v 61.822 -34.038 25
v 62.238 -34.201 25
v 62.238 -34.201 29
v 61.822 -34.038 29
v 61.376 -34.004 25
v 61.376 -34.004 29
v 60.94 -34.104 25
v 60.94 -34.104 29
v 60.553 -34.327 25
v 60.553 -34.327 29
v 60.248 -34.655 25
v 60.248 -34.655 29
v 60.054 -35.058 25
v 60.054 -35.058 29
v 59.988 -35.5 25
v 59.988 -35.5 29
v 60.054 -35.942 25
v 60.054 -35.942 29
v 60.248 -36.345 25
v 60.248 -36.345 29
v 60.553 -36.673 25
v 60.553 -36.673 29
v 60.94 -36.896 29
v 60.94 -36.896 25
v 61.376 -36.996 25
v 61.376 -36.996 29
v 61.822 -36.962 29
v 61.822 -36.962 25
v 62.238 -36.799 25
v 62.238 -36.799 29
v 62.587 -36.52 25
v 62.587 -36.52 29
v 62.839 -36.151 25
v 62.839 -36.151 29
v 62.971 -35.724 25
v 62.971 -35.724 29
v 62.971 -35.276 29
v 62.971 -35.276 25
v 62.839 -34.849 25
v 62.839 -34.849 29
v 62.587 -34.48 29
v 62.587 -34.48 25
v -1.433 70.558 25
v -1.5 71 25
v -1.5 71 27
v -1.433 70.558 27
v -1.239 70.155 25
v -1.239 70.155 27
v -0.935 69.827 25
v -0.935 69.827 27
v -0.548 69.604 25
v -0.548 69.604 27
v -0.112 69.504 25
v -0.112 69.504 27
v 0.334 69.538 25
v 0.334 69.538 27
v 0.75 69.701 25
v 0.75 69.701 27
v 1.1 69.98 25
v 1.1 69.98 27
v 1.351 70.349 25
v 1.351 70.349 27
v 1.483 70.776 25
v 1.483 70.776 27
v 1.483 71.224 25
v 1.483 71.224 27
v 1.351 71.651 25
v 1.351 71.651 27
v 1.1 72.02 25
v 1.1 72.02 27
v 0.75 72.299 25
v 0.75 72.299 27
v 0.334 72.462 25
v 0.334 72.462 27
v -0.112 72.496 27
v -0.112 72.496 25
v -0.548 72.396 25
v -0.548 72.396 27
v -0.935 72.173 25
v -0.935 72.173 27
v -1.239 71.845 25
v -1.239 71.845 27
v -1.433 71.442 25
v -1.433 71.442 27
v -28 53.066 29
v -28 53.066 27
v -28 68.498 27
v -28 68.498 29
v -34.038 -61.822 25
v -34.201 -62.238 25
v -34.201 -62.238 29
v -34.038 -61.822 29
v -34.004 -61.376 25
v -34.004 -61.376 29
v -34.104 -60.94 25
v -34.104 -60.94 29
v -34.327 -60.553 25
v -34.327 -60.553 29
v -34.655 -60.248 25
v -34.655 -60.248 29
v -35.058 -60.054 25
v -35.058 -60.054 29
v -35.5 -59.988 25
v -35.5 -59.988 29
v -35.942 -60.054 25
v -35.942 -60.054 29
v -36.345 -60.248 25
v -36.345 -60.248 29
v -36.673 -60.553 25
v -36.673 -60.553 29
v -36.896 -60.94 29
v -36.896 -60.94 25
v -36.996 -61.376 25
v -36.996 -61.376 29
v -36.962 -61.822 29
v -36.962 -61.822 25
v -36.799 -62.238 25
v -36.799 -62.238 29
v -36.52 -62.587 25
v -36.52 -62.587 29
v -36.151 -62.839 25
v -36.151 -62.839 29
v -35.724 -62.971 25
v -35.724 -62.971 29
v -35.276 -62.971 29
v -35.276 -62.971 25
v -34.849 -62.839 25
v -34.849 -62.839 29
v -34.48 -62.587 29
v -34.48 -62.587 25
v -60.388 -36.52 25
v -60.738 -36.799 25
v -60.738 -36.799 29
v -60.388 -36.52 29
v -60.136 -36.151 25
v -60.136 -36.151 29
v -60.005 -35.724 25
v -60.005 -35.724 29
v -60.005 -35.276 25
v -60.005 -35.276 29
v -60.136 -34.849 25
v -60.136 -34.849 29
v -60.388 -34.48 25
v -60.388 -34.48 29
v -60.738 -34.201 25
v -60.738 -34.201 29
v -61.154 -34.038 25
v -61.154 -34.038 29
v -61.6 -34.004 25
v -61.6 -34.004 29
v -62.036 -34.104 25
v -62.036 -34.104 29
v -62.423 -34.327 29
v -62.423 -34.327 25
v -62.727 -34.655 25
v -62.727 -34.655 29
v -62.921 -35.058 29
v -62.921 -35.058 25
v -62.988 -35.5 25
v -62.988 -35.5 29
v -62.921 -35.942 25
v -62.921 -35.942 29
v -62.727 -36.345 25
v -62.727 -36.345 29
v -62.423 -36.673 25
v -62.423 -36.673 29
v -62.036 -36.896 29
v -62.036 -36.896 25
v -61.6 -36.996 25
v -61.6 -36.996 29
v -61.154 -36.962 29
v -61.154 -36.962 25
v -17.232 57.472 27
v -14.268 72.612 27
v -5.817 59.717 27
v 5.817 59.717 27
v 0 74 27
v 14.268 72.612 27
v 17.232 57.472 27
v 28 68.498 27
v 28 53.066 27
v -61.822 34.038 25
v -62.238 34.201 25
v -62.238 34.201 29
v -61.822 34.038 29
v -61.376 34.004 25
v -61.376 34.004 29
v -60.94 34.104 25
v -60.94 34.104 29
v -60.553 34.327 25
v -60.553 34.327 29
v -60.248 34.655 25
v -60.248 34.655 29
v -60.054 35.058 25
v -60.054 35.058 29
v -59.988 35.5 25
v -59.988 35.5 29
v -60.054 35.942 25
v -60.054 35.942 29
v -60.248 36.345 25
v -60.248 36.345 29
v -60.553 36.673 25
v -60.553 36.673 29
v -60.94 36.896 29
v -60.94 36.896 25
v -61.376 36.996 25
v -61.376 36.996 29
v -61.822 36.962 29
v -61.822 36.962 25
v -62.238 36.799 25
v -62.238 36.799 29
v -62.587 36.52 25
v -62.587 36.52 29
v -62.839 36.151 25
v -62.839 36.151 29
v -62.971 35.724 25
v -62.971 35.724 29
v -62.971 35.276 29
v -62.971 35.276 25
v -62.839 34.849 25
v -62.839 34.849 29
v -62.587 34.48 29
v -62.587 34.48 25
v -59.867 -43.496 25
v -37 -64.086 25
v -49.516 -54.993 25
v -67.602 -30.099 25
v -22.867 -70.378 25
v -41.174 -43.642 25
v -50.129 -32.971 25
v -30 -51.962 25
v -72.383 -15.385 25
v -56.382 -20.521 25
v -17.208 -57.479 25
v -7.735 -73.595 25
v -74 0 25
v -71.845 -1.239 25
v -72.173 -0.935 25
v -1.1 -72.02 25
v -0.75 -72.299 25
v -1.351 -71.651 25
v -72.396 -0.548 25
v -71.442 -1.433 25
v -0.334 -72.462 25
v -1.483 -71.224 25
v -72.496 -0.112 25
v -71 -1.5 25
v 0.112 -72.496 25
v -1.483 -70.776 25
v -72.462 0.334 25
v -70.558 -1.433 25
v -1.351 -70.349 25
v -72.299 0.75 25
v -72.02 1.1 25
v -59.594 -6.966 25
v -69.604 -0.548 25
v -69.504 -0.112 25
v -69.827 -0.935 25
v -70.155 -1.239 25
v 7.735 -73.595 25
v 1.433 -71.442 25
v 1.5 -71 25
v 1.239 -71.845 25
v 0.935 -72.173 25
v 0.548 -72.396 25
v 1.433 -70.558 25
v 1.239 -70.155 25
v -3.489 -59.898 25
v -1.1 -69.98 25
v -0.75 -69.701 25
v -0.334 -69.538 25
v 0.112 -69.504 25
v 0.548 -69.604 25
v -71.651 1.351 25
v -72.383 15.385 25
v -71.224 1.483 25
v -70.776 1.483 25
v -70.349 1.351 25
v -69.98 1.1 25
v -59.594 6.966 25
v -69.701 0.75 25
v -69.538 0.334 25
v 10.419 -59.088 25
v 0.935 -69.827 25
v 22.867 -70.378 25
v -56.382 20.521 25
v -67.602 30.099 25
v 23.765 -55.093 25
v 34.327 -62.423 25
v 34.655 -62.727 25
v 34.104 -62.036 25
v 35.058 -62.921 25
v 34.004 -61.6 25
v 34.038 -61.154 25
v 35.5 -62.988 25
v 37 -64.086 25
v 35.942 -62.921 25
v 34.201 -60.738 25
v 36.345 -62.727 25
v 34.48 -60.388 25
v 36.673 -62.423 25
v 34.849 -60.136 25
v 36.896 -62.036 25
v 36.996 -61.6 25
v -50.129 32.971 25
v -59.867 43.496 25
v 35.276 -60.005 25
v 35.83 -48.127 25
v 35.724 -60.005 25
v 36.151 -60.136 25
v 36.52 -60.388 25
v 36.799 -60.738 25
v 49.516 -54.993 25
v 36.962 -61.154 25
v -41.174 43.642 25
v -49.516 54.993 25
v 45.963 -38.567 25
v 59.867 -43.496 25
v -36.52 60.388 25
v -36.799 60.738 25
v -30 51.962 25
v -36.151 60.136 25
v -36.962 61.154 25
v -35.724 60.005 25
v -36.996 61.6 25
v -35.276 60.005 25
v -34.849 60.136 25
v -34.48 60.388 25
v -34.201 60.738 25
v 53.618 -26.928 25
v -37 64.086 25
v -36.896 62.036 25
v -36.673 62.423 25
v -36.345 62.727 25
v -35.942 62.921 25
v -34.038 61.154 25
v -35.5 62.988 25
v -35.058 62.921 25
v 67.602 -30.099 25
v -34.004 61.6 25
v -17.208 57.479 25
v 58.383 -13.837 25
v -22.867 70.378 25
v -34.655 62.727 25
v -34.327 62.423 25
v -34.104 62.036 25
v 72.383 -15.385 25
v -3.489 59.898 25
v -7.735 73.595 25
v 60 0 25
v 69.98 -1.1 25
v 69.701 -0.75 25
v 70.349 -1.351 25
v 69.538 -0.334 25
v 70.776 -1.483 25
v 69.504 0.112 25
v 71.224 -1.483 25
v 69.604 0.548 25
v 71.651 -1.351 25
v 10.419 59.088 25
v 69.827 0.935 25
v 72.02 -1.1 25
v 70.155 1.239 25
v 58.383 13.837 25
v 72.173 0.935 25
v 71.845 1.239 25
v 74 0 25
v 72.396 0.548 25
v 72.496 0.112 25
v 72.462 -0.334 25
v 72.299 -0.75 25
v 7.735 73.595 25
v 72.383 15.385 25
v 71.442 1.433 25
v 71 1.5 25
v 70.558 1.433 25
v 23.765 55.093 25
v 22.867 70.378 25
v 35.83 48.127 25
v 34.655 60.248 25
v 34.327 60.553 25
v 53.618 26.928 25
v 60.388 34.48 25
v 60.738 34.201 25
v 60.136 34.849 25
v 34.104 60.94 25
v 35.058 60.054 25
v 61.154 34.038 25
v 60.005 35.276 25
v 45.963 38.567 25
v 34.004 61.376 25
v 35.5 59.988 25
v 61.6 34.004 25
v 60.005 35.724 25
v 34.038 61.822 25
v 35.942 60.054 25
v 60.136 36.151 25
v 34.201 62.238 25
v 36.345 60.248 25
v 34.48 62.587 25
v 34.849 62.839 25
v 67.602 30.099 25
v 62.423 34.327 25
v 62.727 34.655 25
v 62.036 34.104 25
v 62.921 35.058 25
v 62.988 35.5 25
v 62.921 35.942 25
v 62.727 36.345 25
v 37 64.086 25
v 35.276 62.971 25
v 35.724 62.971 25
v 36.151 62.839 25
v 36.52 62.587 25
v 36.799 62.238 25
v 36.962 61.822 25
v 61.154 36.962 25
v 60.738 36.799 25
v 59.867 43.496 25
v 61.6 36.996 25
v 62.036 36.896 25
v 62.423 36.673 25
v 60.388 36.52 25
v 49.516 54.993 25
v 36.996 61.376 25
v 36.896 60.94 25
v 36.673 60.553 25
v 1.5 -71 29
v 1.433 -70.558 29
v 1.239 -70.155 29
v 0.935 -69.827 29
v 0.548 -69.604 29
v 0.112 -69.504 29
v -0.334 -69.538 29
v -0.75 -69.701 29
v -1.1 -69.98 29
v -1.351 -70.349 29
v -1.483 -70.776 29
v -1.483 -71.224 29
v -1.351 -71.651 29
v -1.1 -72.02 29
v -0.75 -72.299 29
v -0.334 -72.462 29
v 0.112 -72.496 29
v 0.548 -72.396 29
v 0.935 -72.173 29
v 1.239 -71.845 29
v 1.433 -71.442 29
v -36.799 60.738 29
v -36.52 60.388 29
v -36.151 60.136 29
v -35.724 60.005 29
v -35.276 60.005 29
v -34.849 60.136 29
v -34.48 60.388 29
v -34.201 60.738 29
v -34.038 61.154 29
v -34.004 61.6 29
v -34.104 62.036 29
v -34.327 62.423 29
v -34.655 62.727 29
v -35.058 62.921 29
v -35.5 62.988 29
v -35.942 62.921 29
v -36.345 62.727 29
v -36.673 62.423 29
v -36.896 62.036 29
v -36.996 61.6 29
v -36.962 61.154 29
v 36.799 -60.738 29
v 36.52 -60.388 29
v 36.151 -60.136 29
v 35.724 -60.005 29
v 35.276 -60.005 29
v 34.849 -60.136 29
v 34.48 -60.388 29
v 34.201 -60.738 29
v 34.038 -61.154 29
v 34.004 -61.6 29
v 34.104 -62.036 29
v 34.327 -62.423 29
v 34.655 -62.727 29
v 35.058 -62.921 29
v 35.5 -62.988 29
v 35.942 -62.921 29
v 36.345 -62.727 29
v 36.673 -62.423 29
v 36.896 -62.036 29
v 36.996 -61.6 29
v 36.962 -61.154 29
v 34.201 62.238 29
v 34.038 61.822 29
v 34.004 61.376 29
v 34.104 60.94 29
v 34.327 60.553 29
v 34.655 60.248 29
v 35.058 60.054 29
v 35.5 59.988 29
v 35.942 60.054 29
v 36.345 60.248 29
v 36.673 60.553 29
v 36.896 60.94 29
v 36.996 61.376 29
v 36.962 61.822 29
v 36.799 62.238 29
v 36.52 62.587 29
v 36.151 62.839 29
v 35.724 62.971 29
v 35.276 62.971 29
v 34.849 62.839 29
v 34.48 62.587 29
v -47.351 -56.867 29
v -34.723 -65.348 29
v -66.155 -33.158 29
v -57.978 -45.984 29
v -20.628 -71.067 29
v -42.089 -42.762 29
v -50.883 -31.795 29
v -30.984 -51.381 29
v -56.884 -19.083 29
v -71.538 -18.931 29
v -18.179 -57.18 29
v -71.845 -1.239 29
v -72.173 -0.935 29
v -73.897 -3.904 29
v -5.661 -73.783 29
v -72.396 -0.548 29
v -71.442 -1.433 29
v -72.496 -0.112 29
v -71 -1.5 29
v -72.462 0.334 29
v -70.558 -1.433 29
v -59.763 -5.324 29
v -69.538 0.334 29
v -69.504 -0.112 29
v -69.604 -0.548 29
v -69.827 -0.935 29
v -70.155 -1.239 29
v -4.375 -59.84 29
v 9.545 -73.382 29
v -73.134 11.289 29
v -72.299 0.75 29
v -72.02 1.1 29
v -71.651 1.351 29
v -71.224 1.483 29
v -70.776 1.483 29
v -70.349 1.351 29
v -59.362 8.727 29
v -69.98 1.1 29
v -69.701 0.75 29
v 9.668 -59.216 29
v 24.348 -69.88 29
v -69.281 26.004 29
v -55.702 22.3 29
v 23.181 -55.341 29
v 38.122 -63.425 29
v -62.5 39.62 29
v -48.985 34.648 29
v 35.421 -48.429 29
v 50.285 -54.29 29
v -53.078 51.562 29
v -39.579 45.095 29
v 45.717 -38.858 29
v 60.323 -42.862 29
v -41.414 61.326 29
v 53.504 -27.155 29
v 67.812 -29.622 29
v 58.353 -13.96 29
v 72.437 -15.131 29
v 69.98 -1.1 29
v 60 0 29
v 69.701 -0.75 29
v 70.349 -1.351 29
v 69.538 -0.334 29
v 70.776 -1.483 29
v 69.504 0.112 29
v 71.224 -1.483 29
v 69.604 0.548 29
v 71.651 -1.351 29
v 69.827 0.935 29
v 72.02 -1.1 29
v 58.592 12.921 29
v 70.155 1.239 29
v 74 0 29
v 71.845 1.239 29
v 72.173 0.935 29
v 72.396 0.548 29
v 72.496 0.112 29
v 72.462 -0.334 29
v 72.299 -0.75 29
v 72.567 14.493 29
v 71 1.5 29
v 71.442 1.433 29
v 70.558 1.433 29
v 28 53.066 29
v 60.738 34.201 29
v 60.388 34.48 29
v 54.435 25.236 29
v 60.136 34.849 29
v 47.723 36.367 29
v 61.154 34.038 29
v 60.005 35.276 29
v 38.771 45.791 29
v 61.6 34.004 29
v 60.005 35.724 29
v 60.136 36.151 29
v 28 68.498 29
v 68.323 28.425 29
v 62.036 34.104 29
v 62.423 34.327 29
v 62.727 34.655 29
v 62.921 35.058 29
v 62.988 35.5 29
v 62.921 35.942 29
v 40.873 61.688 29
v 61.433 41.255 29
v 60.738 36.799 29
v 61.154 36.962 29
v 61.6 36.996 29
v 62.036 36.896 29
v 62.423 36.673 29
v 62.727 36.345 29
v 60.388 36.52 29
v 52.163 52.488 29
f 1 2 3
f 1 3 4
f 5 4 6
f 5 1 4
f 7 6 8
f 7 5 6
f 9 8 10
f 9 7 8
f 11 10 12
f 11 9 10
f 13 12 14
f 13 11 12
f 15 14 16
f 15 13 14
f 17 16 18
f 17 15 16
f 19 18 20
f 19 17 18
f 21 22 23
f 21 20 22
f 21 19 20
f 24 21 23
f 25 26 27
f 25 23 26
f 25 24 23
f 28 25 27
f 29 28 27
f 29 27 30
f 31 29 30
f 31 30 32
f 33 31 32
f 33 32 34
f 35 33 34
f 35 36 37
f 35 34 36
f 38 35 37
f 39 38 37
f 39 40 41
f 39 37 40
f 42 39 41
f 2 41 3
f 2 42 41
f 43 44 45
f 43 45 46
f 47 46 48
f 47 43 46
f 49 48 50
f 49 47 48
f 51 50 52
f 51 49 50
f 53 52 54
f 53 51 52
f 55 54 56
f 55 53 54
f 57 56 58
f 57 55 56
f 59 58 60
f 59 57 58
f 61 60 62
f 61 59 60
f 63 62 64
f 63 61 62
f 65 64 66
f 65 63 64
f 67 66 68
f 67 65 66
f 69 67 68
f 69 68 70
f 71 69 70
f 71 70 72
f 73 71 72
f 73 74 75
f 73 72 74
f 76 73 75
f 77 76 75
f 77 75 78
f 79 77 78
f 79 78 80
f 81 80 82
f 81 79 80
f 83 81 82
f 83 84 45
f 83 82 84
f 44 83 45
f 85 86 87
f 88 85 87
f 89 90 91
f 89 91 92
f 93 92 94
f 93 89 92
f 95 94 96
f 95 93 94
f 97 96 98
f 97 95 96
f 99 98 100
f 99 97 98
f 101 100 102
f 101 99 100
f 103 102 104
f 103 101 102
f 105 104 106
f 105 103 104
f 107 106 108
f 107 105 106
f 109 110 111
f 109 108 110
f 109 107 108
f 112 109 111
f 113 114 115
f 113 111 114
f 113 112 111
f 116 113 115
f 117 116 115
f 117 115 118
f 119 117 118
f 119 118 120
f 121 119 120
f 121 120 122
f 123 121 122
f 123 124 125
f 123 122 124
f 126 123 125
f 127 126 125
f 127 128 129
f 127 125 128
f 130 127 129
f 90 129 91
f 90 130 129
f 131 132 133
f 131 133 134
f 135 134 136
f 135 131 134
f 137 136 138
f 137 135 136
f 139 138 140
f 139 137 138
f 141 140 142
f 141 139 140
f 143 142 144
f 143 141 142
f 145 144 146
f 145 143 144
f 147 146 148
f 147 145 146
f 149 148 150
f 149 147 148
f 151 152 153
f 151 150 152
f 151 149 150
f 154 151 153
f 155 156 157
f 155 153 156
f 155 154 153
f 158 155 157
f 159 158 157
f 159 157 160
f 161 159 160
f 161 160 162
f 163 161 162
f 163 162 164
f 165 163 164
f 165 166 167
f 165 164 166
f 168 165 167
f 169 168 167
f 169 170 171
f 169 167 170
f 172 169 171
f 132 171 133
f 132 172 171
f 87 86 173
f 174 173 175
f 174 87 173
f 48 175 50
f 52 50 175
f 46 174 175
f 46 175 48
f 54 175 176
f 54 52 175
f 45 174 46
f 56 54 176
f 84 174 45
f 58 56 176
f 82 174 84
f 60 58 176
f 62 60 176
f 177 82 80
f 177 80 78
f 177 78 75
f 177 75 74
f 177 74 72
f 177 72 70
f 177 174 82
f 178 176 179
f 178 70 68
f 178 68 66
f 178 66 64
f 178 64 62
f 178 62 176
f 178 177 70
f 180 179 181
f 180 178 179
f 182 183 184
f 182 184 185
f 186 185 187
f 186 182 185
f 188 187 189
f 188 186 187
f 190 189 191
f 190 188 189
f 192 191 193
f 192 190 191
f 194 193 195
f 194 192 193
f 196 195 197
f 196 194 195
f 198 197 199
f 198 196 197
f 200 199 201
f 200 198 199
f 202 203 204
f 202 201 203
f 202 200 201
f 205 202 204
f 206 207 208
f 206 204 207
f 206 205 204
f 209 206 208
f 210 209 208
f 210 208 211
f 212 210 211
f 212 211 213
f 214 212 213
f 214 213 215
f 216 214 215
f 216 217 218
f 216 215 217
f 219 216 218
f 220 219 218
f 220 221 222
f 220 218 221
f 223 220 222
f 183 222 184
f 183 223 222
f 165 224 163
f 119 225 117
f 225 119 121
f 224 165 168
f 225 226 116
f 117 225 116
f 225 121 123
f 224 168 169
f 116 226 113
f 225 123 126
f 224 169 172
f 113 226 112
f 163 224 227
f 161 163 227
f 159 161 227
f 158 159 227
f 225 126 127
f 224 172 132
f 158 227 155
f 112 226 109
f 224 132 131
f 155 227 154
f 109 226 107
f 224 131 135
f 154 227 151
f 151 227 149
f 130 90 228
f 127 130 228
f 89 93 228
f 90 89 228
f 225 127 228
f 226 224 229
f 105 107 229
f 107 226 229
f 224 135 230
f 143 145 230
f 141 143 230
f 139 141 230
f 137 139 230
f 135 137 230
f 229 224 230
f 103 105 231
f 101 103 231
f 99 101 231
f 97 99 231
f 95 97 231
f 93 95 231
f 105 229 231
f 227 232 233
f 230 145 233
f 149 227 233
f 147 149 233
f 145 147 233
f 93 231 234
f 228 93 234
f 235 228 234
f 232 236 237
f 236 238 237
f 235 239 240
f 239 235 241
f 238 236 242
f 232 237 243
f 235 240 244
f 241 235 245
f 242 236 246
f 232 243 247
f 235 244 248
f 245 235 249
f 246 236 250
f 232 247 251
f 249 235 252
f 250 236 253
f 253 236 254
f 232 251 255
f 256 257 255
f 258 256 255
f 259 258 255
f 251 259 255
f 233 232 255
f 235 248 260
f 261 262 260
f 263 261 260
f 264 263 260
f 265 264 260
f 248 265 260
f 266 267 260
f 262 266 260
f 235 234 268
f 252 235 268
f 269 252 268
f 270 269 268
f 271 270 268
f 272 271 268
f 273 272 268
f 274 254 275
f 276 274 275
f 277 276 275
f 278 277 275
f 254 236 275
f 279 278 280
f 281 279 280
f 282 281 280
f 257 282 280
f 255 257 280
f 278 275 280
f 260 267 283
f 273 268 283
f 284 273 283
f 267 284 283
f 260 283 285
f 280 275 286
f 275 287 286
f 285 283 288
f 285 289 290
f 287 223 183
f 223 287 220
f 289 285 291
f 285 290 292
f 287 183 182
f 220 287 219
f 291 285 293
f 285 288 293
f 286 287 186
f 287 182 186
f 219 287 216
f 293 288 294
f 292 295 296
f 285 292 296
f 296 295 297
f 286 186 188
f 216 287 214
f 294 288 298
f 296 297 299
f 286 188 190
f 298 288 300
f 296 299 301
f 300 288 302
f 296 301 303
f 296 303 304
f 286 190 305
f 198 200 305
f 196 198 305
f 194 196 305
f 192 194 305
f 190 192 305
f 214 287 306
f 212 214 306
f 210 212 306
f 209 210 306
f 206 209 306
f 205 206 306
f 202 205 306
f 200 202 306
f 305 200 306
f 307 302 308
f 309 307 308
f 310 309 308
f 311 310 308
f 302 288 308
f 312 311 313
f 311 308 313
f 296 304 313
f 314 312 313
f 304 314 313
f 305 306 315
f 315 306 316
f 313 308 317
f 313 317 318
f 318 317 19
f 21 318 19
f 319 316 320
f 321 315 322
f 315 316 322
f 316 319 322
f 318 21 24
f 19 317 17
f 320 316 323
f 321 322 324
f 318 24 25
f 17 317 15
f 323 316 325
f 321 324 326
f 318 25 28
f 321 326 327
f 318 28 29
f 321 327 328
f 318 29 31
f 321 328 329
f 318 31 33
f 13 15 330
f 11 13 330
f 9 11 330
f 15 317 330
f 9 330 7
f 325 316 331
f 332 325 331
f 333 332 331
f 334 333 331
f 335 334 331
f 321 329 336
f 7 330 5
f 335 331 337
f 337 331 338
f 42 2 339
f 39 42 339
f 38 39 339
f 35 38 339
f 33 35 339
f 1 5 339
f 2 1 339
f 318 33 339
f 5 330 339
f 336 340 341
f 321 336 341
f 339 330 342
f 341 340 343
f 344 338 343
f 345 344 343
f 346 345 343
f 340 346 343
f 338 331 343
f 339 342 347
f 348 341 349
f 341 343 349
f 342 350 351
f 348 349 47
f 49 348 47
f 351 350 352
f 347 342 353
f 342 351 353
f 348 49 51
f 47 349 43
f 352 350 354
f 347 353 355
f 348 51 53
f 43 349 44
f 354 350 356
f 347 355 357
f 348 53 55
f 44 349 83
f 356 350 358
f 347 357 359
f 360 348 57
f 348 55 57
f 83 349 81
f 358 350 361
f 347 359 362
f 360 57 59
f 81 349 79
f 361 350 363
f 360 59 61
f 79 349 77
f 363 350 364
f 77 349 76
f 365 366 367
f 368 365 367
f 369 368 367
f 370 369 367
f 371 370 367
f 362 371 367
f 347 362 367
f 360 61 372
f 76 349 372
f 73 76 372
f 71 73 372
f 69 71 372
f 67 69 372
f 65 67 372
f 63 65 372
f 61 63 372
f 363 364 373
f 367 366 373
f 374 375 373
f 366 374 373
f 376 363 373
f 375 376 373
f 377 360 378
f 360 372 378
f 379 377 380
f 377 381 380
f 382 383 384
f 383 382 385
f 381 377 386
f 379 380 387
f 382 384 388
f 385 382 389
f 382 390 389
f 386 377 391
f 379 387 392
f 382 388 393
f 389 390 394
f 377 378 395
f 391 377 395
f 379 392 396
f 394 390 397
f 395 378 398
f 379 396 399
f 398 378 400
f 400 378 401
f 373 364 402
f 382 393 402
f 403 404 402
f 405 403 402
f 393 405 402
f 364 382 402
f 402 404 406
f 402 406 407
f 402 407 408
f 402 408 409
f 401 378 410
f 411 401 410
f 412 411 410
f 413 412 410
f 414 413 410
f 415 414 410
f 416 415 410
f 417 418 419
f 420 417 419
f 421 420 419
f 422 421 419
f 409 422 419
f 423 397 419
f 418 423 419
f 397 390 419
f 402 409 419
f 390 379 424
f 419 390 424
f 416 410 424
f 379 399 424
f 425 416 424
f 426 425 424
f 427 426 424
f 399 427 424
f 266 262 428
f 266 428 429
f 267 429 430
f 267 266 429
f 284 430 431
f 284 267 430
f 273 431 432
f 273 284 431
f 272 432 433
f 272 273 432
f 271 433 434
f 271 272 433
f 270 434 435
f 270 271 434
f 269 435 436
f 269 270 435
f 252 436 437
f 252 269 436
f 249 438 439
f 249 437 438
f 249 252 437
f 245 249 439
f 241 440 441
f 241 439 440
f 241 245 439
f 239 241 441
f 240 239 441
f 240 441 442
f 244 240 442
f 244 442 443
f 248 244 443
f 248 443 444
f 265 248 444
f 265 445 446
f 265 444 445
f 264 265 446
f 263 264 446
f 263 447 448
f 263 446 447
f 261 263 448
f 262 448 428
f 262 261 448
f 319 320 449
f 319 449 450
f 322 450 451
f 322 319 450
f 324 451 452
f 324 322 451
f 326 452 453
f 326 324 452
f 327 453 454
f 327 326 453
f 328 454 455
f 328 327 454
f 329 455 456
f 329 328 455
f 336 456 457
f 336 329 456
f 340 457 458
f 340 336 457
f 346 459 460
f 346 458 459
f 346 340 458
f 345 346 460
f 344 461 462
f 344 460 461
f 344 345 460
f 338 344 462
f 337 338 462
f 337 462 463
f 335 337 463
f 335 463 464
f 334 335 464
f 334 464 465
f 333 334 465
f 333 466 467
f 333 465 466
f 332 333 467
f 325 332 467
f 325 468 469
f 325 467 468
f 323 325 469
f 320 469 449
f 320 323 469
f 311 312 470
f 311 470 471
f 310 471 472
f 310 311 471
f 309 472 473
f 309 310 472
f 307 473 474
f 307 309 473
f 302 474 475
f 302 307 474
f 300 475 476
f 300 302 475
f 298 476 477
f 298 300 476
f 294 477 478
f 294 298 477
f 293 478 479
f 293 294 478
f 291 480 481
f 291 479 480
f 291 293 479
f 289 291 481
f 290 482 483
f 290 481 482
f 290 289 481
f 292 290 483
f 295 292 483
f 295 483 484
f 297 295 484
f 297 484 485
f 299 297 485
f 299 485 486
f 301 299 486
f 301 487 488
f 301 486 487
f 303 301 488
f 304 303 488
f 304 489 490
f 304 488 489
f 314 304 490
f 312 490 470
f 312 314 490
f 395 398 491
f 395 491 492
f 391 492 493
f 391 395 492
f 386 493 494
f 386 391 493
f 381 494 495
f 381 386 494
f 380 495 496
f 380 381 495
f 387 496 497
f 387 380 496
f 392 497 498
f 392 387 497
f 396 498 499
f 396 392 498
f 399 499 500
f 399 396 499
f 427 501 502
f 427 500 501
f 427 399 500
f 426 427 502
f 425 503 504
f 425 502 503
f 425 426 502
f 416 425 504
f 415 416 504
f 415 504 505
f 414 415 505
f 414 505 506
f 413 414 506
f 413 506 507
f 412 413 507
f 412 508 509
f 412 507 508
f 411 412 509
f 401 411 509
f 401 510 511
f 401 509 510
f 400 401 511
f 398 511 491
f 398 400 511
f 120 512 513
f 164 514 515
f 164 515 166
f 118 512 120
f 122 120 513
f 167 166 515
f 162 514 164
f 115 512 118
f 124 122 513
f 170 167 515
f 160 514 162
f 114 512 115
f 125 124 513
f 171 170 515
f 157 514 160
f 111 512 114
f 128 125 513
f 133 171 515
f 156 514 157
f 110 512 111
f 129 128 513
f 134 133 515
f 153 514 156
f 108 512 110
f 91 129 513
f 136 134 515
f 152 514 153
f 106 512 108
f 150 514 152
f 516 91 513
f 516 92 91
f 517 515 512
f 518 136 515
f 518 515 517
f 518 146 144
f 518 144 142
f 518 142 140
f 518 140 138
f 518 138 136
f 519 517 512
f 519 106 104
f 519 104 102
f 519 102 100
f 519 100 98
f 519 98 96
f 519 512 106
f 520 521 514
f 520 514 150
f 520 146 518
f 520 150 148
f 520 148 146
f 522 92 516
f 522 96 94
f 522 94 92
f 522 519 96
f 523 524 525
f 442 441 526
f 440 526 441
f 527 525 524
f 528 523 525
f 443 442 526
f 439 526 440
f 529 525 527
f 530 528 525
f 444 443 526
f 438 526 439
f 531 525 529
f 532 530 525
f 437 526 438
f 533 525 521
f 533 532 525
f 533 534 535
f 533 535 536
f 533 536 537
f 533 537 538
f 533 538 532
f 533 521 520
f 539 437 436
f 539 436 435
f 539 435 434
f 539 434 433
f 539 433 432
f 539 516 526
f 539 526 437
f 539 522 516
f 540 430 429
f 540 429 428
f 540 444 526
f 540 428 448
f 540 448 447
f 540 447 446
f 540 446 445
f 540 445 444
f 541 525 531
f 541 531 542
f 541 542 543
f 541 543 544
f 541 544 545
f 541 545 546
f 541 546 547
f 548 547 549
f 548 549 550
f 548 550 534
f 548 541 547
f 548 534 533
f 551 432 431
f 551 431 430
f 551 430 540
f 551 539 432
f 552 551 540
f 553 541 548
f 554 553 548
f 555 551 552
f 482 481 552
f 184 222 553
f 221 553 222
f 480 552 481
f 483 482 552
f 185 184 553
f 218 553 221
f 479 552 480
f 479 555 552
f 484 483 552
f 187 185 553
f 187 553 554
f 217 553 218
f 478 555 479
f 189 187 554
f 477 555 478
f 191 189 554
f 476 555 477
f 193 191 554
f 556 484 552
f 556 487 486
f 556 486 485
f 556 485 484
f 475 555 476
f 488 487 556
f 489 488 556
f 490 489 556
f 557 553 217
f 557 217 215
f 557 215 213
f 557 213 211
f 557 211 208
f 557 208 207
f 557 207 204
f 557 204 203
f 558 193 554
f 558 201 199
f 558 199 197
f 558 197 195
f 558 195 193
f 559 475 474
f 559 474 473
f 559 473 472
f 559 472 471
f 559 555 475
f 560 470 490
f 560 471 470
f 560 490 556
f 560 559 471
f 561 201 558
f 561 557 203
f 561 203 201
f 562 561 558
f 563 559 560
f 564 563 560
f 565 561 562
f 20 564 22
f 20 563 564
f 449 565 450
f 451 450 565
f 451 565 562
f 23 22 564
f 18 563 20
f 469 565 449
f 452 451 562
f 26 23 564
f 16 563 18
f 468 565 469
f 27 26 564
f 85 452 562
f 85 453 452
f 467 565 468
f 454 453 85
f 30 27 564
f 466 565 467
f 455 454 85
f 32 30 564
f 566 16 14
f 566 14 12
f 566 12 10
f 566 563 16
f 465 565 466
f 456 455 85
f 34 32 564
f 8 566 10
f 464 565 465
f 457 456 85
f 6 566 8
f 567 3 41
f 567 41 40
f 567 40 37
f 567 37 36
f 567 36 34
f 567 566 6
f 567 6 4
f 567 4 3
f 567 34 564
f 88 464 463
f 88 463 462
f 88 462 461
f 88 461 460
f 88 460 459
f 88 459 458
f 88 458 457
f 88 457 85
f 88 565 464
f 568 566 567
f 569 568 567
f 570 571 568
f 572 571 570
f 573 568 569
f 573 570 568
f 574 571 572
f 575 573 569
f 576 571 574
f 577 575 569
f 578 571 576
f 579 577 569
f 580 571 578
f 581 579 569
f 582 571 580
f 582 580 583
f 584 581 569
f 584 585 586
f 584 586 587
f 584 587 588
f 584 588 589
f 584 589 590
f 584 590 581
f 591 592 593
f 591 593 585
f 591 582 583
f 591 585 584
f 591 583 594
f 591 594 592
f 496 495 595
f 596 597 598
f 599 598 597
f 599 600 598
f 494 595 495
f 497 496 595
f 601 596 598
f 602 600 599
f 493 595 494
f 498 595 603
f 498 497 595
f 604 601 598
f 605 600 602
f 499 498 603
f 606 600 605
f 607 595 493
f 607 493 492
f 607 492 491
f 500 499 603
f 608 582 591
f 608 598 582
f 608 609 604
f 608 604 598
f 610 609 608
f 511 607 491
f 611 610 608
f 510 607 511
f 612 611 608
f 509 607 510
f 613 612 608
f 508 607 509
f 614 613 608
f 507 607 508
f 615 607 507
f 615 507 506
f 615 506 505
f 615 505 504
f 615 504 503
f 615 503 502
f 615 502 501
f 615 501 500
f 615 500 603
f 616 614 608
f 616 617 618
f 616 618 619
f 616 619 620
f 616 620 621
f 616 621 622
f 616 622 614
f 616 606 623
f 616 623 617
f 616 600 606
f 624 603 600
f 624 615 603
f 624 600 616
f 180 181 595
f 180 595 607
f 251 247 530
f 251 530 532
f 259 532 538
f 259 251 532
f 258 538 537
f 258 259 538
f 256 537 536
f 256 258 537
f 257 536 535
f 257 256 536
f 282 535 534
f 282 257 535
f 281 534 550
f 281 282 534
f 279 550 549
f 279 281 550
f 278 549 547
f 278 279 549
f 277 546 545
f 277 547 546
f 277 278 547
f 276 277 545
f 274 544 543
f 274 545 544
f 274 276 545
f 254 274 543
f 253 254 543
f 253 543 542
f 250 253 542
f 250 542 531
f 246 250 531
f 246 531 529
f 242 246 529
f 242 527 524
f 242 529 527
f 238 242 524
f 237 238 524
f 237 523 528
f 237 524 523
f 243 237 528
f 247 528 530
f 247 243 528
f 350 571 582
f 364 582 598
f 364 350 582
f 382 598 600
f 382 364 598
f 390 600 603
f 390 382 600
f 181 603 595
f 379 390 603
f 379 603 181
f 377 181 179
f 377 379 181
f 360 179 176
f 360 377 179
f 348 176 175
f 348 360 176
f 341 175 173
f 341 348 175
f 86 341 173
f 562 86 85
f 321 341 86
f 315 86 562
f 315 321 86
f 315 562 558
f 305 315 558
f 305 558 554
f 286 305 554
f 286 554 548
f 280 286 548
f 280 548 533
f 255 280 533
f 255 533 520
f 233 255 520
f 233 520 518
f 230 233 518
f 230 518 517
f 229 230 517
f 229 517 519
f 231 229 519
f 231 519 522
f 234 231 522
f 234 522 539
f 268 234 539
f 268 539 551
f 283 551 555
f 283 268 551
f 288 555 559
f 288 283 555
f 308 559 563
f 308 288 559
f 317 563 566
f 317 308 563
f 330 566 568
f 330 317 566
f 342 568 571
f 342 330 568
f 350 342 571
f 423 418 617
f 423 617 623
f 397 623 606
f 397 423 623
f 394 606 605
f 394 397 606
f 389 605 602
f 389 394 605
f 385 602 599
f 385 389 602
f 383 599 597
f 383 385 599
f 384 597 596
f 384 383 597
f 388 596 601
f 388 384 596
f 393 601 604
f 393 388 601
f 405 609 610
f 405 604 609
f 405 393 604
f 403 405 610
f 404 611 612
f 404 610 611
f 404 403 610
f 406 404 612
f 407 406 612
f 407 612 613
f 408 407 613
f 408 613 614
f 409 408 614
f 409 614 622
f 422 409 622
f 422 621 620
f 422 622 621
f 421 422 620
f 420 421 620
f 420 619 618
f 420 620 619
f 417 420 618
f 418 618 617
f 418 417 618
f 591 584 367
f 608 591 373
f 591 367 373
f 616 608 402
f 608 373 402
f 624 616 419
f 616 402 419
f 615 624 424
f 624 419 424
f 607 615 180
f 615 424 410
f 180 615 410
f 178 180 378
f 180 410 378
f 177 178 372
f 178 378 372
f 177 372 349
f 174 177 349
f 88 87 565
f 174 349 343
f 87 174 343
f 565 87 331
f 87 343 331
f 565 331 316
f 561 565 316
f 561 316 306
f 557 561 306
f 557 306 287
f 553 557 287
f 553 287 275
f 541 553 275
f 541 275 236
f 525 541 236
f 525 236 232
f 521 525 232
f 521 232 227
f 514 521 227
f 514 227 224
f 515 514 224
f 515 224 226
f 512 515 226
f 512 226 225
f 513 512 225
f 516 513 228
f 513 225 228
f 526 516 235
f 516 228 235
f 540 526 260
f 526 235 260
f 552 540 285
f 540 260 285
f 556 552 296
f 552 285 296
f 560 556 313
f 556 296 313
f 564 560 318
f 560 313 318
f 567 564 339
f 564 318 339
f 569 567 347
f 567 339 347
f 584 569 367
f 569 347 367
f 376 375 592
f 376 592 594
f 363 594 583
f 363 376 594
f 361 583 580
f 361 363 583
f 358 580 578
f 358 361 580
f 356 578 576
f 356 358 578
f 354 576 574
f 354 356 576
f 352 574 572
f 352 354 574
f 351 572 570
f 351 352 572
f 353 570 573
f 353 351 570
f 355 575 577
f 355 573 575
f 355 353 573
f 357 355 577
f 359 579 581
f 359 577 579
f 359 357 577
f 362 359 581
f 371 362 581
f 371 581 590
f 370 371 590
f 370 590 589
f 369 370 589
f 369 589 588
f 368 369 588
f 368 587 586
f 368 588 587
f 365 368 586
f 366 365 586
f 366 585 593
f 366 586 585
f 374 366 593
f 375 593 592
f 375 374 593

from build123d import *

# Parameters (mm, degrees)
BOX179_W                     = 56
BOX179_H                     = 200
BOX179_DEPTH                 = 47
CYLINDER2007_R               = 1.5
CYLINDER2007_DEPTH           = 72
CYLINDER2007_PLACEMENT_ANGLE = 30
CYLINDER2006_R               = 1.5
CYLINDER2006_DEPTH           = 72
CYLINDER2006_PLACEMENT_ANGLE = 60
CYLINDER2011_R               = 1.5
CYLINDER2011_DEPTH           = 72
CYLINDER2012_R               = 1.5
CYLINDER2012_DEPTH           = 72
CYLINDER2012_PLACEMENT_ANGLE = 120
CYLINDER2013_R               = 1.5
CYLINDER2013_DEPTH           = 72
CYLINDER2013_PLACEMENT_ANGLE = 150
CYLINDER2010_R               = 1.5
CYLINDER2010_DEPTH           = 72
CYLINDER2017_R               = 1.5
CYLINDER2017_DEPTH           = 72
CYLINDER2017_PLACEMENT_ANGLE = 210
CYLINDER2016_R               = 1.5
CYLINDER2016_DEPTH           = 72
CYLINDER2016_PLACEMENT_ANGLE = 240
CYLINDER2015_R               = 1.5
CYLINDER2015_DEPTH           = 72
CYLINDER2008_R               = 1.5
CYLINDER2008_DEPTH           = 72
CYLINDER2008_PLACEMENT_ANGLE = 60
CYLINDER2014_R               = 1.5
CYLINDER2014_DEPTH           = 72
CYLINDER2014_PLACEMENT_ANGLE = 30
CYLINDER2009_R               = 1.5
CYLINDER2009_DEPTH           = 72
TUBE052_R                    = 74
TUBE052_R_2                  = 60
TUBE052_DEPTH                = 4


with BuildPart() as krychle179:
    # Box179 → Box179 (new body)
    with BuildSketch(Plane(origin=(-28, 0, 27), x_dir=(1, 0, 0), z_dir=(0, 0, 1))):
        with Locations((28, 100)):
            Rectangle(BOX179_W, BOX179_H)
    extrude(amount=BOX179_DEPTH)


with BuildPart() as v_lec2007:
    # Cylinder2007 → Cylinder2007 (new body)
    with BuildSketch(Plane.XY):
        Circle(CYLINDER2007_R)
    extrude(amount=CYLINDER2007_DEPTH)


with BuildPart() as v_lec2007_1:
    # Cylinder2007 placement: moved
    add(v_lec2007.part.moved(Location((35.5, -61.487804, 0))).rotate(Axis((35.5, -61.487804, 0), (0, 0, 1)), CYLINDER2007_PLACEMENT_ANGLE))


with BuildPart() as v_lec2006:
    # Cylinder2006 → Cylinder2006 (new body)
    with BuildSketch(Plane.XY):
        Circle(CYLINDER2006_R)
    extrude(amount=CYLINDER2006_DEPTH)


with BuildPart() as v_lec2006_1:
    # Cylinder2006 placement: moved
    add(v_lec2006.part.moved(Location((61.487804, -35.5, 0))).rotate(Axis((61.487804, -35.5, 0), (0, 0, 1)), CYLINDER2006_PLACEMENT_ANGLE))


with BuildPart() as v_lec2011:
    # Cylinder2011 → Cylinder2011 (new body)
    with BuildSketch(Plane(origin=(71, 0, 0), x_dir=(0, 1, 0), z_dir=(0, 0, 1))):
        Circle(CYLINDER2011_R)
    extrude(amount=CYLINDER2011_DEPTH)


with BuildPart() as v_lec2012:
    # Cylinder2012 → Cylinder2012 (new body)
    with BuildSketch(Plane.XY):
        Circle(CYLINDER2012_R)
    extrude(amount=CYLINDER2012_DEPTH)


with BuildPart() as v_lec2012_1:
    # Cylinder2012 placement: moved
    add(v_lec2012.part.moved(Location((61.487804, 35.5, 0))).rotate(Axis((61.487804, 35.5, 0), (0, 0, 1)), CYLINDER2012_PLACEMENT_ANGLE))


with BuildPart() as v_lec2013:
    # Cylinder2013 → Cylinder2013 (new body)
    with BuildSketch(Plane.XY):
        Circle(CYLINDER2013_R)
    extrude(amount=CYLINDER2013_DEPTH)


with BuildPart() as v_lec2013_1:
    # Cylinder2013 placement: moved
    add(v_lec2013.part.moved(Location((35.5, 61.487804, 0))).rotate(Axis((35.5, 61.487804, 0), (0, 0, 1)), CYLINDER2013_PLACEMENT_ANGLE))


with BuildPart() as v_lec2010:
    # Cylinder2010 → Cylinder2010 (new body)
    with BuildSketch(Plane(origin=(0, 71, 0), x_dir=(-1, 0, 0), z_dir=(0, 0, 1))):
        Circle(CYLINDER2010_R)
    extrude(amount=CYLINDER2010_DEPTH)


with BuildPart() as v_lec2017:
    # Cylinder2017 → Cylinder2017 (new body)
    with BuildSketch(Plane.XY):
        Circle(CYLINDER2017_R)
    extrude(amount=CYLINDER2017_DEPTH)


with BuildPart() as v_lec2017_1:
    # Cylinder2017 placement: moved
    add(v_lec2017.part.moved(Location((-35.5, 61.487804, 0))).rotate(Axis((-35.5, 61.487804, 0), (0, 0, 1)), CYLINDER2017_PLACEMENT_ANGLE))


with BuildPart() as v_lec2016:
    # Cylinder2016 → Cylinder2016 (new body)
    with BuildSketch(Plane.XY):
        Circle(CYLINDER2016_R)
    extrude(amount=CYLINDER2016_DEPTH)


with BuildPart() as v_lec2016_1:
    # Cylinder2016 placement: moved
    add(v_lec2016.part.moved(Location((-61.487804, 35.5, 0))).rotate(Axis((-61.487804, 35.5, 0), (0, 0, 1)), CYLINDER2016_PLACEMENT_ANGLE))


with BuildPart() as v_lec2015:
    # Cylinder2015 → Cylinder2015 (new body)
    with BuildSketch(Plane(origin=(-71, 0, 0), x_dir=(0, -1, 0), z_dir=(0, 0, 1))):
        Circle(CYLINDER2015_R)
    extrude(amount=CYLINDER2015_DEPTH)


with BuildPart() as v_lec2008:
    # Cylinder2008 → Cylinder2008 (new body)
    with BuildSketch(Plane.XY):
        Circle(CYLINDER2008_R)
    extrude(amount=CYLINDER2008_DEPTH)


with BuildPart() as v_lec2008_1:
    # Cylinder2008 placement: moved
    add(v_lec2008.part.moved(Location((-61.487804, -35.5, 0))).rotate(Axis((-61.487804, -35.5, 0), (0, 0, -1)), CYLINDER2008_PLACEMENT_ANGLE))


with BuildPart() as v_lec2014:
    # Cylinder2014 → Cylinder2014 (new body)
    with BuildSketch(Plane.XY):
        Circle(CYLINDER2014_R)
    extrude(amount=CYLINDER2014_DEPTH)


with BuildPart() as v_lec2014_1:
    # Cylinder2014 placement: moved
    add(v_lec2014.part.moved(Location((-35.5, -61.487804, 0))).rotate(Axis((-35.5, -61.487804, 0), (0, 0, -1)), CYLINDER2014_PLACEMENT_ANGLE))


with BuildPart() as compound1084:
    # Cylinder2009 → Cylinder2009 (new body)
    with BuildSketch(Plane(origin=(0, -71, 0), x_dir=(1, 0, 0), z_dir=(0, 0, 1))):
        Circle(CYLINDER2009_R)
    extrude(amount=CYLINDER2009_DEPTH)

    # Compound1084: union Válec2007, Válec2006, Válec2011, Válec2012, Válec2013, Válec2010, Válec2017, Válec2016, Válec2015, Válec2008, Válec2014
    add(v_lec2007_1.part)
    add(v_lec2006_1.part)
    add(v_lec2011.part)
    add(v_lec2012_1.part)
    add(v_lec2013_1.part)
    add(v_lec2010.part)
    add(v_lec2017_1.part)
    add(v_lec2016_1.part)
    add(v_lec2015.part)
    add(v_lec2008_1.part)
    add(v_lec2014_1.part)


with BuildPart() as compound1084_1:
    # Compound1084 placement: moved
    add(compound1084.part.moved(Location((0, 0, -4))))


with BuildPart() as cut683:
    # Tube052 → Tube052 (new body)
    with BuildSketch(Plane.XY.offset(25)):
        Circle(TUBE052_R)
        Circle(TUBE052_R_2, mode=Mode.SUBTRACT)
    extrude(amount=TUBE052_DEPTH)

    # Cut678: cut Compound1084
    add(compound1084_1.part, mode=Mode.SUBTRACT)

    # Cut683: cut Krychle179
    add(krychle179.part, mode=Mode.SUBTRACT)


solid = cut683.part
